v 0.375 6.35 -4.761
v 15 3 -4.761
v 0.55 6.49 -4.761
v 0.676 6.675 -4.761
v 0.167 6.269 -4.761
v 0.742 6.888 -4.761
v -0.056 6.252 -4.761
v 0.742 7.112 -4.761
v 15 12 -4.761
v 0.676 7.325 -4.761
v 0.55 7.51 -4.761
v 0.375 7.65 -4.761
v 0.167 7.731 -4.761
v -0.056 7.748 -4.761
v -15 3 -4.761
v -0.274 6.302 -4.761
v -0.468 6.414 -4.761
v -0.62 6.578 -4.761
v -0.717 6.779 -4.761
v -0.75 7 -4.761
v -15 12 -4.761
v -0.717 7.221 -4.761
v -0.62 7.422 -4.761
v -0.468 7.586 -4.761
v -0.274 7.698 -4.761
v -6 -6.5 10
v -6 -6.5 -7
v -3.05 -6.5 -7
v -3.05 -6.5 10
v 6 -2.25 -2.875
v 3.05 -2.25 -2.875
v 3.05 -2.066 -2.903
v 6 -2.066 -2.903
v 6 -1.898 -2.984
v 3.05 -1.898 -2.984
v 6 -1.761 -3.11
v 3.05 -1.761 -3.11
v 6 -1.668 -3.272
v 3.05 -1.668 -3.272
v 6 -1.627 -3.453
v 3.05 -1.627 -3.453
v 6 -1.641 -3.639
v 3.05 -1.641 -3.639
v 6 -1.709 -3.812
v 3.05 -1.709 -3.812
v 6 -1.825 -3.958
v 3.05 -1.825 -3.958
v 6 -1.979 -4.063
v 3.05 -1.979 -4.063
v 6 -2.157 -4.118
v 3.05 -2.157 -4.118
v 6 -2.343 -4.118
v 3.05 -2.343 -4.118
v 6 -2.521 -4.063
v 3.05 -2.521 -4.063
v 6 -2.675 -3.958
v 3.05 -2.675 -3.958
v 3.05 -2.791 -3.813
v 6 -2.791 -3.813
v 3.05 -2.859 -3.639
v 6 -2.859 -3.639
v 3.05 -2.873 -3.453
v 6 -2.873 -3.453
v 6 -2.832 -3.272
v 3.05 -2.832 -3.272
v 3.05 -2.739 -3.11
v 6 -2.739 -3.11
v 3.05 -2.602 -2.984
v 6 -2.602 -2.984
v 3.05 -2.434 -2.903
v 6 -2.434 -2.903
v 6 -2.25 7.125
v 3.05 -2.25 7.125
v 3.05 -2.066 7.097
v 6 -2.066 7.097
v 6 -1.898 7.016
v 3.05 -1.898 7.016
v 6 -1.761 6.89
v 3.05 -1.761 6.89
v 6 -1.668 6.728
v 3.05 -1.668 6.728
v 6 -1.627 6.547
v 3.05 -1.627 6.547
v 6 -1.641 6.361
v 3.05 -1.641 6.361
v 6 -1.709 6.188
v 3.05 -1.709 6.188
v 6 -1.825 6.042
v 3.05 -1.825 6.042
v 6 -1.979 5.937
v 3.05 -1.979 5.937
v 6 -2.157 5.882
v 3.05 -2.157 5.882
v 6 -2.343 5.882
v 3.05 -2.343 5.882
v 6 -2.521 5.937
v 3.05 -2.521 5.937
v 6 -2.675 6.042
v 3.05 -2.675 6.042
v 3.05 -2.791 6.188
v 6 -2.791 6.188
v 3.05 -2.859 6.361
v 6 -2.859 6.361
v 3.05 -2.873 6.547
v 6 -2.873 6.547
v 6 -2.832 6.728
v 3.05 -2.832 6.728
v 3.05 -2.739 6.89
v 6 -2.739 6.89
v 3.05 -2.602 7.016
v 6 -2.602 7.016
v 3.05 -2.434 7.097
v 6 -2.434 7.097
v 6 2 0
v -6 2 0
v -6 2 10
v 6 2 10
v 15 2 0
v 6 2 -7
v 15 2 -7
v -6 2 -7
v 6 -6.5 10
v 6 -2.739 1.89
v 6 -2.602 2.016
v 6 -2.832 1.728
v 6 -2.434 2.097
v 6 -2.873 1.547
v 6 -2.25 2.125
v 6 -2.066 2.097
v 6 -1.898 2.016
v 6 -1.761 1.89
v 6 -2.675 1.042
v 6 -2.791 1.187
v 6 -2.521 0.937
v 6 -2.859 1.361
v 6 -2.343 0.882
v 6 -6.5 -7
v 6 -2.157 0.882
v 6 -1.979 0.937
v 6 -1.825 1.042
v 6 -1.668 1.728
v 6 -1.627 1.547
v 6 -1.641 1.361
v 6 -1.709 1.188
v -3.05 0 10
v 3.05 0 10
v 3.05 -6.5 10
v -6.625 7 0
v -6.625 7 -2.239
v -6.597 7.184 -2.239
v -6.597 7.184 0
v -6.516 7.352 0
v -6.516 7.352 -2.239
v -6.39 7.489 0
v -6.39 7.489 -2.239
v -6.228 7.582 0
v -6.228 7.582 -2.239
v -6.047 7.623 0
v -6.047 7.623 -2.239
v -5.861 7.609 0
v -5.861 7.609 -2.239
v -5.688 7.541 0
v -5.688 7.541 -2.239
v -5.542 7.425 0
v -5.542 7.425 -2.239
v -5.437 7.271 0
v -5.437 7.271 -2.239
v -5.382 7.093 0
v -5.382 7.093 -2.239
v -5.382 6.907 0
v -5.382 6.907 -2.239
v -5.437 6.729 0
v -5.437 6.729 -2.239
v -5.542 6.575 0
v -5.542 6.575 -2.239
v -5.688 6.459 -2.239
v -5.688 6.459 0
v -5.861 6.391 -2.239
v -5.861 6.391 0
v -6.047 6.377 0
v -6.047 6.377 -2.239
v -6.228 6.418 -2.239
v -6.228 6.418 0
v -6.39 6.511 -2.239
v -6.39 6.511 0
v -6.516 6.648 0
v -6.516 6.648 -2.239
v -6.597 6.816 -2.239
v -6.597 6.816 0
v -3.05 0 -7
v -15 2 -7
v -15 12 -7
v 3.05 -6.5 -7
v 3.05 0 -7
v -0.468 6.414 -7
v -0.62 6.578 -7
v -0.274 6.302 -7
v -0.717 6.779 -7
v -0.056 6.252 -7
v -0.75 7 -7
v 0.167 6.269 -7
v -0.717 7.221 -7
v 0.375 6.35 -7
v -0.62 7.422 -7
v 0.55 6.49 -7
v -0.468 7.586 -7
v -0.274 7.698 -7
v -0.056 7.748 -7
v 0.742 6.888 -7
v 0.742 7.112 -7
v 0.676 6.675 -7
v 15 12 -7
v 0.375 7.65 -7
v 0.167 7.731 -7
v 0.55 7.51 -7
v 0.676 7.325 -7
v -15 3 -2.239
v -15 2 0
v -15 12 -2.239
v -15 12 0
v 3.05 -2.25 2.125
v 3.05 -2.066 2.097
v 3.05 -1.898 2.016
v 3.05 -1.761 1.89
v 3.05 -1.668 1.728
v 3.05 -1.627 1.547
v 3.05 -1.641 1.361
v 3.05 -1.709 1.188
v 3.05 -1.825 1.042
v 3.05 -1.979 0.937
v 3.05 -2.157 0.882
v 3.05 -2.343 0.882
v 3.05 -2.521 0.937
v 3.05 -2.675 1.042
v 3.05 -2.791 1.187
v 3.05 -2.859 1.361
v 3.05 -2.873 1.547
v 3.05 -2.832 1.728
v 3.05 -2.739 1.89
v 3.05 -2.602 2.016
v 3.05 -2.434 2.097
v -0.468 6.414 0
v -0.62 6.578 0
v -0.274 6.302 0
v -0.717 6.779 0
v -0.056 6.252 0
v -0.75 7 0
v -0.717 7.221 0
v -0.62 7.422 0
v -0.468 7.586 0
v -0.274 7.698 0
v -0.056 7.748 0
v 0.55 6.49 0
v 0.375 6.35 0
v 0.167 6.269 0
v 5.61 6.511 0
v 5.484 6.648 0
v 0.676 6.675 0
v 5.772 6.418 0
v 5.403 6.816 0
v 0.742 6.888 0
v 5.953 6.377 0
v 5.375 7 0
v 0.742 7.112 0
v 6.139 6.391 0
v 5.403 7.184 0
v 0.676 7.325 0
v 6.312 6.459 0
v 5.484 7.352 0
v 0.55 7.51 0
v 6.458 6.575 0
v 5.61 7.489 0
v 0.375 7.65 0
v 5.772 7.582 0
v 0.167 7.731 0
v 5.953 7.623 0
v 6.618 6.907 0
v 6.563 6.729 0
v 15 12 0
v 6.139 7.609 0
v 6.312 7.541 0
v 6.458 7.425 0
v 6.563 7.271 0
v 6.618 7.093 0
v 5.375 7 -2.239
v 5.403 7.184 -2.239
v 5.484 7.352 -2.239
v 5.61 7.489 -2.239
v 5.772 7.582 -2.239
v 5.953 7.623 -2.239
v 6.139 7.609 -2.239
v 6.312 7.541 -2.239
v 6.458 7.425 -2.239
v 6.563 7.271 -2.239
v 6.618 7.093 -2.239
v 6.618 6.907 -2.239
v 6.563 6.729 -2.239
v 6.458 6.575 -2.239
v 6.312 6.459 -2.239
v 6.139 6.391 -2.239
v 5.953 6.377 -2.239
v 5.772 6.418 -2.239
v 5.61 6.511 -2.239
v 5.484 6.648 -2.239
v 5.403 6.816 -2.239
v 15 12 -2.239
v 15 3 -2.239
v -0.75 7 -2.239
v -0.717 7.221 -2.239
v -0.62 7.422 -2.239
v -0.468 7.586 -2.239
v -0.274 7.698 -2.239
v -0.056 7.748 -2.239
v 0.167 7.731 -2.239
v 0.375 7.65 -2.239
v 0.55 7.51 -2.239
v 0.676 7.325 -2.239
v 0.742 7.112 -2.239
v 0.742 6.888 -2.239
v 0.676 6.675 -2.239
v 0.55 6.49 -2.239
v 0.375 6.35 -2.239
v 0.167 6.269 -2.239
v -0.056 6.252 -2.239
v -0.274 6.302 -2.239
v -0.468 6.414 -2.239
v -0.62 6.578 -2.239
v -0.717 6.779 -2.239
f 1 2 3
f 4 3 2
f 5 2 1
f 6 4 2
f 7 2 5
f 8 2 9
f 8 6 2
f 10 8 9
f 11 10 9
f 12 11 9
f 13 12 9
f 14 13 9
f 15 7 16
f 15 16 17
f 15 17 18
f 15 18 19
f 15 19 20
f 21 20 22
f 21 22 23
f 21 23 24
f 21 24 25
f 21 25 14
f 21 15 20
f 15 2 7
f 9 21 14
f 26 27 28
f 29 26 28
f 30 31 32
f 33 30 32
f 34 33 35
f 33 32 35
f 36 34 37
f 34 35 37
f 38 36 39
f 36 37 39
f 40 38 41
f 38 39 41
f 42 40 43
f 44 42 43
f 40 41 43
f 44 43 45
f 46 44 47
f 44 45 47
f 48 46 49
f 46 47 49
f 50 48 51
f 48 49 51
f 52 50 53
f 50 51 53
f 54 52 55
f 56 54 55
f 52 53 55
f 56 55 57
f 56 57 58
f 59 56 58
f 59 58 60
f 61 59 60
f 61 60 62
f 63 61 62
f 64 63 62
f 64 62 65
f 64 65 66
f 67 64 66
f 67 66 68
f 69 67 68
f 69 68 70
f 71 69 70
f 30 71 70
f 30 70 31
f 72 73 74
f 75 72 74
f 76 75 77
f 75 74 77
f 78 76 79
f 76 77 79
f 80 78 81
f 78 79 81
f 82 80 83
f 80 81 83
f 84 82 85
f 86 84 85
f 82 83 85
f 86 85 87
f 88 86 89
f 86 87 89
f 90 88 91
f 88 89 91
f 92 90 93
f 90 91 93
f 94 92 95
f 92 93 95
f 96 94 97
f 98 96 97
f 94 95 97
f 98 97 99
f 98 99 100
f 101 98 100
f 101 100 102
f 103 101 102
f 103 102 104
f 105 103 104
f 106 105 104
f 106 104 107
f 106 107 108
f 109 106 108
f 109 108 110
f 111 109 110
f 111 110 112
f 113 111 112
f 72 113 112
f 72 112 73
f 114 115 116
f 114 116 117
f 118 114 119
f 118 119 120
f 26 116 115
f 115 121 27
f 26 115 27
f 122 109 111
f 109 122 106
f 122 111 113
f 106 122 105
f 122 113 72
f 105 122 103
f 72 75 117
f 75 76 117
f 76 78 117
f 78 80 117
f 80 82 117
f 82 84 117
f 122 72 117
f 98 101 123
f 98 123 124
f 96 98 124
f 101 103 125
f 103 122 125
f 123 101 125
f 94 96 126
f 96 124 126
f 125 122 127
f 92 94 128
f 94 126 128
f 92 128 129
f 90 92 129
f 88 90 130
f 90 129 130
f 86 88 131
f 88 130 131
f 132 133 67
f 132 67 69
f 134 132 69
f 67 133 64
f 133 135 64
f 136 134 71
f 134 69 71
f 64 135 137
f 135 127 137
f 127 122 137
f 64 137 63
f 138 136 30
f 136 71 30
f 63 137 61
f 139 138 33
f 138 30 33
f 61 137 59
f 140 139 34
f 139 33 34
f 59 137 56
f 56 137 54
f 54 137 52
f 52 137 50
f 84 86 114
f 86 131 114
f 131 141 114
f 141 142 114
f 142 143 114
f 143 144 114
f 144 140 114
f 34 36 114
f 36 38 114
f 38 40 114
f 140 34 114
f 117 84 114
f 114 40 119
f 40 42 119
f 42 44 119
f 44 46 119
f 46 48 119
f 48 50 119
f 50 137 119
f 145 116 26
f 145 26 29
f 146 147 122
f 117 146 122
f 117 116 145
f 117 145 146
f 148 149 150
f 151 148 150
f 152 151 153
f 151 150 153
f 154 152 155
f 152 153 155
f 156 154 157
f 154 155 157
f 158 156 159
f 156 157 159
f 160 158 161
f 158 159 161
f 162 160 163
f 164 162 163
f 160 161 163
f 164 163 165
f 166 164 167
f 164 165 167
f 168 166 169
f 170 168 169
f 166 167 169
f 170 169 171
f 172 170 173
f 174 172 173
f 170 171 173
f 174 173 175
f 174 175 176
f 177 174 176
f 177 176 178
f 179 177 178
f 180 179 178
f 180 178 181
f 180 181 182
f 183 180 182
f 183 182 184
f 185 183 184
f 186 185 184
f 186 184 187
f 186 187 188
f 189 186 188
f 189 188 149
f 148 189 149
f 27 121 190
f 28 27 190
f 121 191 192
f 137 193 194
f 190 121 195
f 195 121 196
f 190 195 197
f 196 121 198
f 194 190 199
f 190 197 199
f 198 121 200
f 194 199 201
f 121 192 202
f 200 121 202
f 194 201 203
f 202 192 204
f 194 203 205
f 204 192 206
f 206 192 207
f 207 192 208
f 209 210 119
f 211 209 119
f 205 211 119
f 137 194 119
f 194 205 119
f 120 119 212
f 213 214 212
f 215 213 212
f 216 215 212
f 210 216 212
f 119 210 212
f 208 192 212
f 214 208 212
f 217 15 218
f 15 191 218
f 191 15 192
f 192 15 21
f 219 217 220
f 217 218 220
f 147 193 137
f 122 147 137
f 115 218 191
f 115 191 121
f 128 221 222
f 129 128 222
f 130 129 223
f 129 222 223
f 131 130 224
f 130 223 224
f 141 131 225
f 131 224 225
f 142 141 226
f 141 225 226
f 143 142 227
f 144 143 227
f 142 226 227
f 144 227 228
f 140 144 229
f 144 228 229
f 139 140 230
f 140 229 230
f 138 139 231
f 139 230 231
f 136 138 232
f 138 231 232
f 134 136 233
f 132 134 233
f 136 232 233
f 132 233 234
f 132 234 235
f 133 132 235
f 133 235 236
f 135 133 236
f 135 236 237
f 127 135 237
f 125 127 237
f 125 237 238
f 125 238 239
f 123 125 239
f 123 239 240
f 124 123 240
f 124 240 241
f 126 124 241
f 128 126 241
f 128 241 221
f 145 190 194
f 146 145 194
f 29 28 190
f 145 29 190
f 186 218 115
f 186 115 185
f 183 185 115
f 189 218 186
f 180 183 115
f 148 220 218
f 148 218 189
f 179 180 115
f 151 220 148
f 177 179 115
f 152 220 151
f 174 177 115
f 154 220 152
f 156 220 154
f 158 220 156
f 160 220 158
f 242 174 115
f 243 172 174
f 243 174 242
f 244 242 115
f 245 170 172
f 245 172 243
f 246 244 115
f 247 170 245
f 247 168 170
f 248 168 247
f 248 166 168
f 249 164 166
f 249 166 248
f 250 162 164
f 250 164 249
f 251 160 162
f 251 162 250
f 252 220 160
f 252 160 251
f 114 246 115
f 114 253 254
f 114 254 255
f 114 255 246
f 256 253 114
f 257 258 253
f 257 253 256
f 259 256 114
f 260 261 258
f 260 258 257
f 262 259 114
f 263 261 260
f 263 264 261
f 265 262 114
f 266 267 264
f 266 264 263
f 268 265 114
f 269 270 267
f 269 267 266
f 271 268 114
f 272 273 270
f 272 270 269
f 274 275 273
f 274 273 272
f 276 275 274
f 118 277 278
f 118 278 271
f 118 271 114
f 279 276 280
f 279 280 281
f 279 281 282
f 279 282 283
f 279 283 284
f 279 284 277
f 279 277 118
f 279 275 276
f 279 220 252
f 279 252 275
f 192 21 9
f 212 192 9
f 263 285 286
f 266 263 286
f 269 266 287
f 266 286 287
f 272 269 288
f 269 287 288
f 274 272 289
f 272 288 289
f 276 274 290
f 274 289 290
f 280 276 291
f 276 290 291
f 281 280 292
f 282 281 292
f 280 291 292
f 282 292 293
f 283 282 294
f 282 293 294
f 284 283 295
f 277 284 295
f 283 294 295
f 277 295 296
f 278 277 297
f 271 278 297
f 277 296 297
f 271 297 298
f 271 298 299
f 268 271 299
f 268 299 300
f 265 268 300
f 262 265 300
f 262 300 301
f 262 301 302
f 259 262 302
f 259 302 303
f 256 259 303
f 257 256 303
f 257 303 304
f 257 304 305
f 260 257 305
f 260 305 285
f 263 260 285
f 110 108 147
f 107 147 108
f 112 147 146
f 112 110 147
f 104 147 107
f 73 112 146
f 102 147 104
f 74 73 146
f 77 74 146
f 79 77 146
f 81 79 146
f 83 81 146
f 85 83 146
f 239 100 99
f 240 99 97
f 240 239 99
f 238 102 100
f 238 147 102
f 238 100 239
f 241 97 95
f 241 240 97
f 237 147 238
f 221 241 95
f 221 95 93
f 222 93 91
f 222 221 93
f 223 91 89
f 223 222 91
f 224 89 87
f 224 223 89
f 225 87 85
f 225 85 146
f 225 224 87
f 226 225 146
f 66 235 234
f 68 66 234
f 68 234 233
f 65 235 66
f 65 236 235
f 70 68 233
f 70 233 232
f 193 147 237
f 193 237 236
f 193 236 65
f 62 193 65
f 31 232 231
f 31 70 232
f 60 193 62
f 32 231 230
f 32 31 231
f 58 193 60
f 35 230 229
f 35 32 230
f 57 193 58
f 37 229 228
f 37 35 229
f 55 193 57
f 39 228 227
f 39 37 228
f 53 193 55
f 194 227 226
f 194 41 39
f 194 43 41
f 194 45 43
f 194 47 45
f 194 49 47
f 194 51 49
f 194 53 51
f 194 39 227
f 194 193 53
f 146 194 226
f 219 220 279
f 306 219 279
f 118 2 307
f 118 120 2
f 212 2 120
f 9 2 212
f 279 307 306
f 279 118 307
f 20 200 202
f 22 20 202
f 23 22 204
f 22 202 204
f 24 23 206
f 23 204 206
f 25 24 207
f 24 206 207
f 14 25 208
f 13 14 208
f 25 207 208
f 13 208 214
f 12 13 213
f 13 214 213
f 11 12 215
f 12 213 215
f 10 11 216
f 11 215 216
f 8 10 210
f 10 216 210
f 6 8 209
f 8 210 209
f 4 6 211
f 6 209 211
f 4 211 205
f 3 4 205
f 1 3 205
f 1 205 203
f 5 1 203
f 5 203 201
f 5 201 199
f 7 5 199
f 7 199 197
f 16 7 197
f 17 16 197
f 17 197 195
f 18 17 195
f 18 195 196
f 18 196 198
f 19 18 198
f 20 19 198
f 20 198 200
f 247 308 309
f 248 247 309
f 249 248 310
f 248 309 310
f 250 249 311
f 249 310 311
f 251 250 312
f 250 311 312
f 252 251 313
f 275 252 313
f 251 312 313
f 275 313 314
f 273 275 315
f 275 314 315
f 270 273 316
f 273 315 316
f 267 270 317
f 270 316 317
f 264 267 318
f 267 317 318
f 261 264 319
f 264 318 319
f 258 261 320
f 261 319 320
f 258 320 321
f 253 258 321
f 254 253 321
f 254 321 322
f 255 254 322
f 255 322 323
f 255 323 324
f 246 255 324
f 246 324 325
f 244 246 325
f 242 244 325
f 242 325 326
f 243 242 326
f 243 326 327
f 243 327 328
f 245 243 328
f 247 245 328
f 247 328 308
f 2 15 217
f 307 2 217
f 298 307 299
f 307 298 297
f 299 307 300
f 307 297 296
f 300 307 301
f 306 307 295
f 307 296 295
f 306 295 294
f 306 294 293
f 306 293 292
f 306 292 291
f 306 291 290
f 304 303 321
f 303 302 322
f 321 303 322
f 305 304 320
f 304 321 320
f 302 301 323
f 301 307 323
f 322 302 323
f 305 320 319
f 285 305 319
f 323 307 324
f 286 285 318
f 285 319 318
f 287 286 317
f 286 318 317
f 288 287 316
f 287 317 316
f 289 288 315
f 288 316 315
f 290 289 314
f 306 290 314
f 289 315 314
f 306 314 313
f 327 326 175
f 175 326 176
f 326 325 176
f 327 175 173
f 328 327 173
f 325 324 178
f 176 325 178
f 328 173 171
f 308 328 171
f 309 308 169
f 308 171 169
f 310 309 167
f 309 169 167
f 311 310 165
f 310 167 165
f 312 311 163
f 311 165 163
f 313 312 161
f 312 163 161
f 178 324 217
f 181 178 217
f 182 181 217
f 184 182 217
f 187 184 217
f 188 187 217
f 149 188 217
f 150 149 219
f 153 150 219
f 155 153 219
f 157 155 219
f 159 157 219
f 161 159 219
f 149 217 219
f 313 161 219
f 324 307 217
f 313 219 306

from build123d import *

# Parameters (mm, degrees)
BOSS_EXTRUDE1_DEPTH          = 10
BOSS_EXTRUDE1_DEPTH_BACK     = 7
SKETCH1_W                    = 12
SKETCH1_H                    = 2
SKETCH1_W_2                  = 2.95
SKETCH1_H_2                  = 6.5
SKETCH1_3_W                  = 30
SKETCH1_3_H                  = 10
BOSS_EXTRUDE2_DEPTH          = 7
SKETCH3_W                    = 2.52297433
SKETCH3_H                    = 9
CUT_EXTRUDE1_DEPTH           = 34.823069051
M1_6X0_35_TAPPED_HOLE1_D     = 1.25
M1_6X0_35_TAPPED_HOLE1_DEPTH = 2.238512835
M1_6X0_35_TAPPED_HOLE2_D     = 1.25
M1_6X0_35_TAPPED_HOLE2_DEPTH = 2.95
F_1_5MM_DOWEL_HOLE1_D        = 1.5


with BuildPart() as part:
    # Sketch1 → Boss-Extrude1 (new, two sides: drawn at the far end of the back side and taken through both)
    with BuildSketch(Plane.XY.offset(-BOSS_EXTRUDE1_DEPTH_BACK)):
        with Locations((0, 1)):
            Rectangle(SKETCH1_W, SKETCH1_H)
        with Locations((4.525, -3.25)):
            Rectangle(SKETCH1_W_2, SKETCH1_H_2)
        with Locations((-4.525, -3.25)):
            Rectangle(SKETCH1_W_2, SKETCH1_H_2)
    extrude(amount=BOSS_EXTRUDE1_DEPTH + BOSS_EXTRUDE1_DEPTH_BACK)

    # Sketch1<3> → Boss-Extrude2 (add)
    with BuildSketch(Plane.XY):
        with Locations((0, 7)):
            Rectangle(SKETCH1_3_W, SKETCH1_3_H)
    extrude(amount=-BOSS_EXTRUDE2_DEPTH)

    # Sketch3 → Cut-Extrude1 (cut, through all)
    with BuildSketch(Plane.ZY.offset(15)):
        with Locations((-3.5, 7.5)):
            Rectangle(SKETCH3_W, SKETCH3_H)
    extrude(amount=-CUT_EXTRUDE1_DEPTH, mode=Mode.SUBTRACT)

    # M1.6x0.35 Tapped Hole1
    with Locations(Plane.XY):
        with Locations((6, 7), (-6, 7)):
            Hole(M1_6X0_35_TAPPED_HOLE1_D / 2, depth=M1_6X0_35_TAPPED_HOLE1_DEPTH)

    # M1.6x0.35 Tapped Hole2
    with Locations(Plane(origin=(6, 0, 0), x_dir=(0, 0, -1), z_dir=(1, 0, 0))):
        with Locations((3.5, -2.25), (-6.5, -2.25), (-1.5, -2.25)):
            Hole(M1_6X0_35_TAPPED_HOLE2_D / 2, depth=M1_6X0_35_TAPPED_HOLE2_DEPTH)

    # Ø1.5mm Dowel Hole1 (through all)
    with Locations(Plane.XY):
        with Locations((0, 7)):
            Hole(F_1_5MM_DOWEL_HOLE1_D / 2)


solid = part.part
